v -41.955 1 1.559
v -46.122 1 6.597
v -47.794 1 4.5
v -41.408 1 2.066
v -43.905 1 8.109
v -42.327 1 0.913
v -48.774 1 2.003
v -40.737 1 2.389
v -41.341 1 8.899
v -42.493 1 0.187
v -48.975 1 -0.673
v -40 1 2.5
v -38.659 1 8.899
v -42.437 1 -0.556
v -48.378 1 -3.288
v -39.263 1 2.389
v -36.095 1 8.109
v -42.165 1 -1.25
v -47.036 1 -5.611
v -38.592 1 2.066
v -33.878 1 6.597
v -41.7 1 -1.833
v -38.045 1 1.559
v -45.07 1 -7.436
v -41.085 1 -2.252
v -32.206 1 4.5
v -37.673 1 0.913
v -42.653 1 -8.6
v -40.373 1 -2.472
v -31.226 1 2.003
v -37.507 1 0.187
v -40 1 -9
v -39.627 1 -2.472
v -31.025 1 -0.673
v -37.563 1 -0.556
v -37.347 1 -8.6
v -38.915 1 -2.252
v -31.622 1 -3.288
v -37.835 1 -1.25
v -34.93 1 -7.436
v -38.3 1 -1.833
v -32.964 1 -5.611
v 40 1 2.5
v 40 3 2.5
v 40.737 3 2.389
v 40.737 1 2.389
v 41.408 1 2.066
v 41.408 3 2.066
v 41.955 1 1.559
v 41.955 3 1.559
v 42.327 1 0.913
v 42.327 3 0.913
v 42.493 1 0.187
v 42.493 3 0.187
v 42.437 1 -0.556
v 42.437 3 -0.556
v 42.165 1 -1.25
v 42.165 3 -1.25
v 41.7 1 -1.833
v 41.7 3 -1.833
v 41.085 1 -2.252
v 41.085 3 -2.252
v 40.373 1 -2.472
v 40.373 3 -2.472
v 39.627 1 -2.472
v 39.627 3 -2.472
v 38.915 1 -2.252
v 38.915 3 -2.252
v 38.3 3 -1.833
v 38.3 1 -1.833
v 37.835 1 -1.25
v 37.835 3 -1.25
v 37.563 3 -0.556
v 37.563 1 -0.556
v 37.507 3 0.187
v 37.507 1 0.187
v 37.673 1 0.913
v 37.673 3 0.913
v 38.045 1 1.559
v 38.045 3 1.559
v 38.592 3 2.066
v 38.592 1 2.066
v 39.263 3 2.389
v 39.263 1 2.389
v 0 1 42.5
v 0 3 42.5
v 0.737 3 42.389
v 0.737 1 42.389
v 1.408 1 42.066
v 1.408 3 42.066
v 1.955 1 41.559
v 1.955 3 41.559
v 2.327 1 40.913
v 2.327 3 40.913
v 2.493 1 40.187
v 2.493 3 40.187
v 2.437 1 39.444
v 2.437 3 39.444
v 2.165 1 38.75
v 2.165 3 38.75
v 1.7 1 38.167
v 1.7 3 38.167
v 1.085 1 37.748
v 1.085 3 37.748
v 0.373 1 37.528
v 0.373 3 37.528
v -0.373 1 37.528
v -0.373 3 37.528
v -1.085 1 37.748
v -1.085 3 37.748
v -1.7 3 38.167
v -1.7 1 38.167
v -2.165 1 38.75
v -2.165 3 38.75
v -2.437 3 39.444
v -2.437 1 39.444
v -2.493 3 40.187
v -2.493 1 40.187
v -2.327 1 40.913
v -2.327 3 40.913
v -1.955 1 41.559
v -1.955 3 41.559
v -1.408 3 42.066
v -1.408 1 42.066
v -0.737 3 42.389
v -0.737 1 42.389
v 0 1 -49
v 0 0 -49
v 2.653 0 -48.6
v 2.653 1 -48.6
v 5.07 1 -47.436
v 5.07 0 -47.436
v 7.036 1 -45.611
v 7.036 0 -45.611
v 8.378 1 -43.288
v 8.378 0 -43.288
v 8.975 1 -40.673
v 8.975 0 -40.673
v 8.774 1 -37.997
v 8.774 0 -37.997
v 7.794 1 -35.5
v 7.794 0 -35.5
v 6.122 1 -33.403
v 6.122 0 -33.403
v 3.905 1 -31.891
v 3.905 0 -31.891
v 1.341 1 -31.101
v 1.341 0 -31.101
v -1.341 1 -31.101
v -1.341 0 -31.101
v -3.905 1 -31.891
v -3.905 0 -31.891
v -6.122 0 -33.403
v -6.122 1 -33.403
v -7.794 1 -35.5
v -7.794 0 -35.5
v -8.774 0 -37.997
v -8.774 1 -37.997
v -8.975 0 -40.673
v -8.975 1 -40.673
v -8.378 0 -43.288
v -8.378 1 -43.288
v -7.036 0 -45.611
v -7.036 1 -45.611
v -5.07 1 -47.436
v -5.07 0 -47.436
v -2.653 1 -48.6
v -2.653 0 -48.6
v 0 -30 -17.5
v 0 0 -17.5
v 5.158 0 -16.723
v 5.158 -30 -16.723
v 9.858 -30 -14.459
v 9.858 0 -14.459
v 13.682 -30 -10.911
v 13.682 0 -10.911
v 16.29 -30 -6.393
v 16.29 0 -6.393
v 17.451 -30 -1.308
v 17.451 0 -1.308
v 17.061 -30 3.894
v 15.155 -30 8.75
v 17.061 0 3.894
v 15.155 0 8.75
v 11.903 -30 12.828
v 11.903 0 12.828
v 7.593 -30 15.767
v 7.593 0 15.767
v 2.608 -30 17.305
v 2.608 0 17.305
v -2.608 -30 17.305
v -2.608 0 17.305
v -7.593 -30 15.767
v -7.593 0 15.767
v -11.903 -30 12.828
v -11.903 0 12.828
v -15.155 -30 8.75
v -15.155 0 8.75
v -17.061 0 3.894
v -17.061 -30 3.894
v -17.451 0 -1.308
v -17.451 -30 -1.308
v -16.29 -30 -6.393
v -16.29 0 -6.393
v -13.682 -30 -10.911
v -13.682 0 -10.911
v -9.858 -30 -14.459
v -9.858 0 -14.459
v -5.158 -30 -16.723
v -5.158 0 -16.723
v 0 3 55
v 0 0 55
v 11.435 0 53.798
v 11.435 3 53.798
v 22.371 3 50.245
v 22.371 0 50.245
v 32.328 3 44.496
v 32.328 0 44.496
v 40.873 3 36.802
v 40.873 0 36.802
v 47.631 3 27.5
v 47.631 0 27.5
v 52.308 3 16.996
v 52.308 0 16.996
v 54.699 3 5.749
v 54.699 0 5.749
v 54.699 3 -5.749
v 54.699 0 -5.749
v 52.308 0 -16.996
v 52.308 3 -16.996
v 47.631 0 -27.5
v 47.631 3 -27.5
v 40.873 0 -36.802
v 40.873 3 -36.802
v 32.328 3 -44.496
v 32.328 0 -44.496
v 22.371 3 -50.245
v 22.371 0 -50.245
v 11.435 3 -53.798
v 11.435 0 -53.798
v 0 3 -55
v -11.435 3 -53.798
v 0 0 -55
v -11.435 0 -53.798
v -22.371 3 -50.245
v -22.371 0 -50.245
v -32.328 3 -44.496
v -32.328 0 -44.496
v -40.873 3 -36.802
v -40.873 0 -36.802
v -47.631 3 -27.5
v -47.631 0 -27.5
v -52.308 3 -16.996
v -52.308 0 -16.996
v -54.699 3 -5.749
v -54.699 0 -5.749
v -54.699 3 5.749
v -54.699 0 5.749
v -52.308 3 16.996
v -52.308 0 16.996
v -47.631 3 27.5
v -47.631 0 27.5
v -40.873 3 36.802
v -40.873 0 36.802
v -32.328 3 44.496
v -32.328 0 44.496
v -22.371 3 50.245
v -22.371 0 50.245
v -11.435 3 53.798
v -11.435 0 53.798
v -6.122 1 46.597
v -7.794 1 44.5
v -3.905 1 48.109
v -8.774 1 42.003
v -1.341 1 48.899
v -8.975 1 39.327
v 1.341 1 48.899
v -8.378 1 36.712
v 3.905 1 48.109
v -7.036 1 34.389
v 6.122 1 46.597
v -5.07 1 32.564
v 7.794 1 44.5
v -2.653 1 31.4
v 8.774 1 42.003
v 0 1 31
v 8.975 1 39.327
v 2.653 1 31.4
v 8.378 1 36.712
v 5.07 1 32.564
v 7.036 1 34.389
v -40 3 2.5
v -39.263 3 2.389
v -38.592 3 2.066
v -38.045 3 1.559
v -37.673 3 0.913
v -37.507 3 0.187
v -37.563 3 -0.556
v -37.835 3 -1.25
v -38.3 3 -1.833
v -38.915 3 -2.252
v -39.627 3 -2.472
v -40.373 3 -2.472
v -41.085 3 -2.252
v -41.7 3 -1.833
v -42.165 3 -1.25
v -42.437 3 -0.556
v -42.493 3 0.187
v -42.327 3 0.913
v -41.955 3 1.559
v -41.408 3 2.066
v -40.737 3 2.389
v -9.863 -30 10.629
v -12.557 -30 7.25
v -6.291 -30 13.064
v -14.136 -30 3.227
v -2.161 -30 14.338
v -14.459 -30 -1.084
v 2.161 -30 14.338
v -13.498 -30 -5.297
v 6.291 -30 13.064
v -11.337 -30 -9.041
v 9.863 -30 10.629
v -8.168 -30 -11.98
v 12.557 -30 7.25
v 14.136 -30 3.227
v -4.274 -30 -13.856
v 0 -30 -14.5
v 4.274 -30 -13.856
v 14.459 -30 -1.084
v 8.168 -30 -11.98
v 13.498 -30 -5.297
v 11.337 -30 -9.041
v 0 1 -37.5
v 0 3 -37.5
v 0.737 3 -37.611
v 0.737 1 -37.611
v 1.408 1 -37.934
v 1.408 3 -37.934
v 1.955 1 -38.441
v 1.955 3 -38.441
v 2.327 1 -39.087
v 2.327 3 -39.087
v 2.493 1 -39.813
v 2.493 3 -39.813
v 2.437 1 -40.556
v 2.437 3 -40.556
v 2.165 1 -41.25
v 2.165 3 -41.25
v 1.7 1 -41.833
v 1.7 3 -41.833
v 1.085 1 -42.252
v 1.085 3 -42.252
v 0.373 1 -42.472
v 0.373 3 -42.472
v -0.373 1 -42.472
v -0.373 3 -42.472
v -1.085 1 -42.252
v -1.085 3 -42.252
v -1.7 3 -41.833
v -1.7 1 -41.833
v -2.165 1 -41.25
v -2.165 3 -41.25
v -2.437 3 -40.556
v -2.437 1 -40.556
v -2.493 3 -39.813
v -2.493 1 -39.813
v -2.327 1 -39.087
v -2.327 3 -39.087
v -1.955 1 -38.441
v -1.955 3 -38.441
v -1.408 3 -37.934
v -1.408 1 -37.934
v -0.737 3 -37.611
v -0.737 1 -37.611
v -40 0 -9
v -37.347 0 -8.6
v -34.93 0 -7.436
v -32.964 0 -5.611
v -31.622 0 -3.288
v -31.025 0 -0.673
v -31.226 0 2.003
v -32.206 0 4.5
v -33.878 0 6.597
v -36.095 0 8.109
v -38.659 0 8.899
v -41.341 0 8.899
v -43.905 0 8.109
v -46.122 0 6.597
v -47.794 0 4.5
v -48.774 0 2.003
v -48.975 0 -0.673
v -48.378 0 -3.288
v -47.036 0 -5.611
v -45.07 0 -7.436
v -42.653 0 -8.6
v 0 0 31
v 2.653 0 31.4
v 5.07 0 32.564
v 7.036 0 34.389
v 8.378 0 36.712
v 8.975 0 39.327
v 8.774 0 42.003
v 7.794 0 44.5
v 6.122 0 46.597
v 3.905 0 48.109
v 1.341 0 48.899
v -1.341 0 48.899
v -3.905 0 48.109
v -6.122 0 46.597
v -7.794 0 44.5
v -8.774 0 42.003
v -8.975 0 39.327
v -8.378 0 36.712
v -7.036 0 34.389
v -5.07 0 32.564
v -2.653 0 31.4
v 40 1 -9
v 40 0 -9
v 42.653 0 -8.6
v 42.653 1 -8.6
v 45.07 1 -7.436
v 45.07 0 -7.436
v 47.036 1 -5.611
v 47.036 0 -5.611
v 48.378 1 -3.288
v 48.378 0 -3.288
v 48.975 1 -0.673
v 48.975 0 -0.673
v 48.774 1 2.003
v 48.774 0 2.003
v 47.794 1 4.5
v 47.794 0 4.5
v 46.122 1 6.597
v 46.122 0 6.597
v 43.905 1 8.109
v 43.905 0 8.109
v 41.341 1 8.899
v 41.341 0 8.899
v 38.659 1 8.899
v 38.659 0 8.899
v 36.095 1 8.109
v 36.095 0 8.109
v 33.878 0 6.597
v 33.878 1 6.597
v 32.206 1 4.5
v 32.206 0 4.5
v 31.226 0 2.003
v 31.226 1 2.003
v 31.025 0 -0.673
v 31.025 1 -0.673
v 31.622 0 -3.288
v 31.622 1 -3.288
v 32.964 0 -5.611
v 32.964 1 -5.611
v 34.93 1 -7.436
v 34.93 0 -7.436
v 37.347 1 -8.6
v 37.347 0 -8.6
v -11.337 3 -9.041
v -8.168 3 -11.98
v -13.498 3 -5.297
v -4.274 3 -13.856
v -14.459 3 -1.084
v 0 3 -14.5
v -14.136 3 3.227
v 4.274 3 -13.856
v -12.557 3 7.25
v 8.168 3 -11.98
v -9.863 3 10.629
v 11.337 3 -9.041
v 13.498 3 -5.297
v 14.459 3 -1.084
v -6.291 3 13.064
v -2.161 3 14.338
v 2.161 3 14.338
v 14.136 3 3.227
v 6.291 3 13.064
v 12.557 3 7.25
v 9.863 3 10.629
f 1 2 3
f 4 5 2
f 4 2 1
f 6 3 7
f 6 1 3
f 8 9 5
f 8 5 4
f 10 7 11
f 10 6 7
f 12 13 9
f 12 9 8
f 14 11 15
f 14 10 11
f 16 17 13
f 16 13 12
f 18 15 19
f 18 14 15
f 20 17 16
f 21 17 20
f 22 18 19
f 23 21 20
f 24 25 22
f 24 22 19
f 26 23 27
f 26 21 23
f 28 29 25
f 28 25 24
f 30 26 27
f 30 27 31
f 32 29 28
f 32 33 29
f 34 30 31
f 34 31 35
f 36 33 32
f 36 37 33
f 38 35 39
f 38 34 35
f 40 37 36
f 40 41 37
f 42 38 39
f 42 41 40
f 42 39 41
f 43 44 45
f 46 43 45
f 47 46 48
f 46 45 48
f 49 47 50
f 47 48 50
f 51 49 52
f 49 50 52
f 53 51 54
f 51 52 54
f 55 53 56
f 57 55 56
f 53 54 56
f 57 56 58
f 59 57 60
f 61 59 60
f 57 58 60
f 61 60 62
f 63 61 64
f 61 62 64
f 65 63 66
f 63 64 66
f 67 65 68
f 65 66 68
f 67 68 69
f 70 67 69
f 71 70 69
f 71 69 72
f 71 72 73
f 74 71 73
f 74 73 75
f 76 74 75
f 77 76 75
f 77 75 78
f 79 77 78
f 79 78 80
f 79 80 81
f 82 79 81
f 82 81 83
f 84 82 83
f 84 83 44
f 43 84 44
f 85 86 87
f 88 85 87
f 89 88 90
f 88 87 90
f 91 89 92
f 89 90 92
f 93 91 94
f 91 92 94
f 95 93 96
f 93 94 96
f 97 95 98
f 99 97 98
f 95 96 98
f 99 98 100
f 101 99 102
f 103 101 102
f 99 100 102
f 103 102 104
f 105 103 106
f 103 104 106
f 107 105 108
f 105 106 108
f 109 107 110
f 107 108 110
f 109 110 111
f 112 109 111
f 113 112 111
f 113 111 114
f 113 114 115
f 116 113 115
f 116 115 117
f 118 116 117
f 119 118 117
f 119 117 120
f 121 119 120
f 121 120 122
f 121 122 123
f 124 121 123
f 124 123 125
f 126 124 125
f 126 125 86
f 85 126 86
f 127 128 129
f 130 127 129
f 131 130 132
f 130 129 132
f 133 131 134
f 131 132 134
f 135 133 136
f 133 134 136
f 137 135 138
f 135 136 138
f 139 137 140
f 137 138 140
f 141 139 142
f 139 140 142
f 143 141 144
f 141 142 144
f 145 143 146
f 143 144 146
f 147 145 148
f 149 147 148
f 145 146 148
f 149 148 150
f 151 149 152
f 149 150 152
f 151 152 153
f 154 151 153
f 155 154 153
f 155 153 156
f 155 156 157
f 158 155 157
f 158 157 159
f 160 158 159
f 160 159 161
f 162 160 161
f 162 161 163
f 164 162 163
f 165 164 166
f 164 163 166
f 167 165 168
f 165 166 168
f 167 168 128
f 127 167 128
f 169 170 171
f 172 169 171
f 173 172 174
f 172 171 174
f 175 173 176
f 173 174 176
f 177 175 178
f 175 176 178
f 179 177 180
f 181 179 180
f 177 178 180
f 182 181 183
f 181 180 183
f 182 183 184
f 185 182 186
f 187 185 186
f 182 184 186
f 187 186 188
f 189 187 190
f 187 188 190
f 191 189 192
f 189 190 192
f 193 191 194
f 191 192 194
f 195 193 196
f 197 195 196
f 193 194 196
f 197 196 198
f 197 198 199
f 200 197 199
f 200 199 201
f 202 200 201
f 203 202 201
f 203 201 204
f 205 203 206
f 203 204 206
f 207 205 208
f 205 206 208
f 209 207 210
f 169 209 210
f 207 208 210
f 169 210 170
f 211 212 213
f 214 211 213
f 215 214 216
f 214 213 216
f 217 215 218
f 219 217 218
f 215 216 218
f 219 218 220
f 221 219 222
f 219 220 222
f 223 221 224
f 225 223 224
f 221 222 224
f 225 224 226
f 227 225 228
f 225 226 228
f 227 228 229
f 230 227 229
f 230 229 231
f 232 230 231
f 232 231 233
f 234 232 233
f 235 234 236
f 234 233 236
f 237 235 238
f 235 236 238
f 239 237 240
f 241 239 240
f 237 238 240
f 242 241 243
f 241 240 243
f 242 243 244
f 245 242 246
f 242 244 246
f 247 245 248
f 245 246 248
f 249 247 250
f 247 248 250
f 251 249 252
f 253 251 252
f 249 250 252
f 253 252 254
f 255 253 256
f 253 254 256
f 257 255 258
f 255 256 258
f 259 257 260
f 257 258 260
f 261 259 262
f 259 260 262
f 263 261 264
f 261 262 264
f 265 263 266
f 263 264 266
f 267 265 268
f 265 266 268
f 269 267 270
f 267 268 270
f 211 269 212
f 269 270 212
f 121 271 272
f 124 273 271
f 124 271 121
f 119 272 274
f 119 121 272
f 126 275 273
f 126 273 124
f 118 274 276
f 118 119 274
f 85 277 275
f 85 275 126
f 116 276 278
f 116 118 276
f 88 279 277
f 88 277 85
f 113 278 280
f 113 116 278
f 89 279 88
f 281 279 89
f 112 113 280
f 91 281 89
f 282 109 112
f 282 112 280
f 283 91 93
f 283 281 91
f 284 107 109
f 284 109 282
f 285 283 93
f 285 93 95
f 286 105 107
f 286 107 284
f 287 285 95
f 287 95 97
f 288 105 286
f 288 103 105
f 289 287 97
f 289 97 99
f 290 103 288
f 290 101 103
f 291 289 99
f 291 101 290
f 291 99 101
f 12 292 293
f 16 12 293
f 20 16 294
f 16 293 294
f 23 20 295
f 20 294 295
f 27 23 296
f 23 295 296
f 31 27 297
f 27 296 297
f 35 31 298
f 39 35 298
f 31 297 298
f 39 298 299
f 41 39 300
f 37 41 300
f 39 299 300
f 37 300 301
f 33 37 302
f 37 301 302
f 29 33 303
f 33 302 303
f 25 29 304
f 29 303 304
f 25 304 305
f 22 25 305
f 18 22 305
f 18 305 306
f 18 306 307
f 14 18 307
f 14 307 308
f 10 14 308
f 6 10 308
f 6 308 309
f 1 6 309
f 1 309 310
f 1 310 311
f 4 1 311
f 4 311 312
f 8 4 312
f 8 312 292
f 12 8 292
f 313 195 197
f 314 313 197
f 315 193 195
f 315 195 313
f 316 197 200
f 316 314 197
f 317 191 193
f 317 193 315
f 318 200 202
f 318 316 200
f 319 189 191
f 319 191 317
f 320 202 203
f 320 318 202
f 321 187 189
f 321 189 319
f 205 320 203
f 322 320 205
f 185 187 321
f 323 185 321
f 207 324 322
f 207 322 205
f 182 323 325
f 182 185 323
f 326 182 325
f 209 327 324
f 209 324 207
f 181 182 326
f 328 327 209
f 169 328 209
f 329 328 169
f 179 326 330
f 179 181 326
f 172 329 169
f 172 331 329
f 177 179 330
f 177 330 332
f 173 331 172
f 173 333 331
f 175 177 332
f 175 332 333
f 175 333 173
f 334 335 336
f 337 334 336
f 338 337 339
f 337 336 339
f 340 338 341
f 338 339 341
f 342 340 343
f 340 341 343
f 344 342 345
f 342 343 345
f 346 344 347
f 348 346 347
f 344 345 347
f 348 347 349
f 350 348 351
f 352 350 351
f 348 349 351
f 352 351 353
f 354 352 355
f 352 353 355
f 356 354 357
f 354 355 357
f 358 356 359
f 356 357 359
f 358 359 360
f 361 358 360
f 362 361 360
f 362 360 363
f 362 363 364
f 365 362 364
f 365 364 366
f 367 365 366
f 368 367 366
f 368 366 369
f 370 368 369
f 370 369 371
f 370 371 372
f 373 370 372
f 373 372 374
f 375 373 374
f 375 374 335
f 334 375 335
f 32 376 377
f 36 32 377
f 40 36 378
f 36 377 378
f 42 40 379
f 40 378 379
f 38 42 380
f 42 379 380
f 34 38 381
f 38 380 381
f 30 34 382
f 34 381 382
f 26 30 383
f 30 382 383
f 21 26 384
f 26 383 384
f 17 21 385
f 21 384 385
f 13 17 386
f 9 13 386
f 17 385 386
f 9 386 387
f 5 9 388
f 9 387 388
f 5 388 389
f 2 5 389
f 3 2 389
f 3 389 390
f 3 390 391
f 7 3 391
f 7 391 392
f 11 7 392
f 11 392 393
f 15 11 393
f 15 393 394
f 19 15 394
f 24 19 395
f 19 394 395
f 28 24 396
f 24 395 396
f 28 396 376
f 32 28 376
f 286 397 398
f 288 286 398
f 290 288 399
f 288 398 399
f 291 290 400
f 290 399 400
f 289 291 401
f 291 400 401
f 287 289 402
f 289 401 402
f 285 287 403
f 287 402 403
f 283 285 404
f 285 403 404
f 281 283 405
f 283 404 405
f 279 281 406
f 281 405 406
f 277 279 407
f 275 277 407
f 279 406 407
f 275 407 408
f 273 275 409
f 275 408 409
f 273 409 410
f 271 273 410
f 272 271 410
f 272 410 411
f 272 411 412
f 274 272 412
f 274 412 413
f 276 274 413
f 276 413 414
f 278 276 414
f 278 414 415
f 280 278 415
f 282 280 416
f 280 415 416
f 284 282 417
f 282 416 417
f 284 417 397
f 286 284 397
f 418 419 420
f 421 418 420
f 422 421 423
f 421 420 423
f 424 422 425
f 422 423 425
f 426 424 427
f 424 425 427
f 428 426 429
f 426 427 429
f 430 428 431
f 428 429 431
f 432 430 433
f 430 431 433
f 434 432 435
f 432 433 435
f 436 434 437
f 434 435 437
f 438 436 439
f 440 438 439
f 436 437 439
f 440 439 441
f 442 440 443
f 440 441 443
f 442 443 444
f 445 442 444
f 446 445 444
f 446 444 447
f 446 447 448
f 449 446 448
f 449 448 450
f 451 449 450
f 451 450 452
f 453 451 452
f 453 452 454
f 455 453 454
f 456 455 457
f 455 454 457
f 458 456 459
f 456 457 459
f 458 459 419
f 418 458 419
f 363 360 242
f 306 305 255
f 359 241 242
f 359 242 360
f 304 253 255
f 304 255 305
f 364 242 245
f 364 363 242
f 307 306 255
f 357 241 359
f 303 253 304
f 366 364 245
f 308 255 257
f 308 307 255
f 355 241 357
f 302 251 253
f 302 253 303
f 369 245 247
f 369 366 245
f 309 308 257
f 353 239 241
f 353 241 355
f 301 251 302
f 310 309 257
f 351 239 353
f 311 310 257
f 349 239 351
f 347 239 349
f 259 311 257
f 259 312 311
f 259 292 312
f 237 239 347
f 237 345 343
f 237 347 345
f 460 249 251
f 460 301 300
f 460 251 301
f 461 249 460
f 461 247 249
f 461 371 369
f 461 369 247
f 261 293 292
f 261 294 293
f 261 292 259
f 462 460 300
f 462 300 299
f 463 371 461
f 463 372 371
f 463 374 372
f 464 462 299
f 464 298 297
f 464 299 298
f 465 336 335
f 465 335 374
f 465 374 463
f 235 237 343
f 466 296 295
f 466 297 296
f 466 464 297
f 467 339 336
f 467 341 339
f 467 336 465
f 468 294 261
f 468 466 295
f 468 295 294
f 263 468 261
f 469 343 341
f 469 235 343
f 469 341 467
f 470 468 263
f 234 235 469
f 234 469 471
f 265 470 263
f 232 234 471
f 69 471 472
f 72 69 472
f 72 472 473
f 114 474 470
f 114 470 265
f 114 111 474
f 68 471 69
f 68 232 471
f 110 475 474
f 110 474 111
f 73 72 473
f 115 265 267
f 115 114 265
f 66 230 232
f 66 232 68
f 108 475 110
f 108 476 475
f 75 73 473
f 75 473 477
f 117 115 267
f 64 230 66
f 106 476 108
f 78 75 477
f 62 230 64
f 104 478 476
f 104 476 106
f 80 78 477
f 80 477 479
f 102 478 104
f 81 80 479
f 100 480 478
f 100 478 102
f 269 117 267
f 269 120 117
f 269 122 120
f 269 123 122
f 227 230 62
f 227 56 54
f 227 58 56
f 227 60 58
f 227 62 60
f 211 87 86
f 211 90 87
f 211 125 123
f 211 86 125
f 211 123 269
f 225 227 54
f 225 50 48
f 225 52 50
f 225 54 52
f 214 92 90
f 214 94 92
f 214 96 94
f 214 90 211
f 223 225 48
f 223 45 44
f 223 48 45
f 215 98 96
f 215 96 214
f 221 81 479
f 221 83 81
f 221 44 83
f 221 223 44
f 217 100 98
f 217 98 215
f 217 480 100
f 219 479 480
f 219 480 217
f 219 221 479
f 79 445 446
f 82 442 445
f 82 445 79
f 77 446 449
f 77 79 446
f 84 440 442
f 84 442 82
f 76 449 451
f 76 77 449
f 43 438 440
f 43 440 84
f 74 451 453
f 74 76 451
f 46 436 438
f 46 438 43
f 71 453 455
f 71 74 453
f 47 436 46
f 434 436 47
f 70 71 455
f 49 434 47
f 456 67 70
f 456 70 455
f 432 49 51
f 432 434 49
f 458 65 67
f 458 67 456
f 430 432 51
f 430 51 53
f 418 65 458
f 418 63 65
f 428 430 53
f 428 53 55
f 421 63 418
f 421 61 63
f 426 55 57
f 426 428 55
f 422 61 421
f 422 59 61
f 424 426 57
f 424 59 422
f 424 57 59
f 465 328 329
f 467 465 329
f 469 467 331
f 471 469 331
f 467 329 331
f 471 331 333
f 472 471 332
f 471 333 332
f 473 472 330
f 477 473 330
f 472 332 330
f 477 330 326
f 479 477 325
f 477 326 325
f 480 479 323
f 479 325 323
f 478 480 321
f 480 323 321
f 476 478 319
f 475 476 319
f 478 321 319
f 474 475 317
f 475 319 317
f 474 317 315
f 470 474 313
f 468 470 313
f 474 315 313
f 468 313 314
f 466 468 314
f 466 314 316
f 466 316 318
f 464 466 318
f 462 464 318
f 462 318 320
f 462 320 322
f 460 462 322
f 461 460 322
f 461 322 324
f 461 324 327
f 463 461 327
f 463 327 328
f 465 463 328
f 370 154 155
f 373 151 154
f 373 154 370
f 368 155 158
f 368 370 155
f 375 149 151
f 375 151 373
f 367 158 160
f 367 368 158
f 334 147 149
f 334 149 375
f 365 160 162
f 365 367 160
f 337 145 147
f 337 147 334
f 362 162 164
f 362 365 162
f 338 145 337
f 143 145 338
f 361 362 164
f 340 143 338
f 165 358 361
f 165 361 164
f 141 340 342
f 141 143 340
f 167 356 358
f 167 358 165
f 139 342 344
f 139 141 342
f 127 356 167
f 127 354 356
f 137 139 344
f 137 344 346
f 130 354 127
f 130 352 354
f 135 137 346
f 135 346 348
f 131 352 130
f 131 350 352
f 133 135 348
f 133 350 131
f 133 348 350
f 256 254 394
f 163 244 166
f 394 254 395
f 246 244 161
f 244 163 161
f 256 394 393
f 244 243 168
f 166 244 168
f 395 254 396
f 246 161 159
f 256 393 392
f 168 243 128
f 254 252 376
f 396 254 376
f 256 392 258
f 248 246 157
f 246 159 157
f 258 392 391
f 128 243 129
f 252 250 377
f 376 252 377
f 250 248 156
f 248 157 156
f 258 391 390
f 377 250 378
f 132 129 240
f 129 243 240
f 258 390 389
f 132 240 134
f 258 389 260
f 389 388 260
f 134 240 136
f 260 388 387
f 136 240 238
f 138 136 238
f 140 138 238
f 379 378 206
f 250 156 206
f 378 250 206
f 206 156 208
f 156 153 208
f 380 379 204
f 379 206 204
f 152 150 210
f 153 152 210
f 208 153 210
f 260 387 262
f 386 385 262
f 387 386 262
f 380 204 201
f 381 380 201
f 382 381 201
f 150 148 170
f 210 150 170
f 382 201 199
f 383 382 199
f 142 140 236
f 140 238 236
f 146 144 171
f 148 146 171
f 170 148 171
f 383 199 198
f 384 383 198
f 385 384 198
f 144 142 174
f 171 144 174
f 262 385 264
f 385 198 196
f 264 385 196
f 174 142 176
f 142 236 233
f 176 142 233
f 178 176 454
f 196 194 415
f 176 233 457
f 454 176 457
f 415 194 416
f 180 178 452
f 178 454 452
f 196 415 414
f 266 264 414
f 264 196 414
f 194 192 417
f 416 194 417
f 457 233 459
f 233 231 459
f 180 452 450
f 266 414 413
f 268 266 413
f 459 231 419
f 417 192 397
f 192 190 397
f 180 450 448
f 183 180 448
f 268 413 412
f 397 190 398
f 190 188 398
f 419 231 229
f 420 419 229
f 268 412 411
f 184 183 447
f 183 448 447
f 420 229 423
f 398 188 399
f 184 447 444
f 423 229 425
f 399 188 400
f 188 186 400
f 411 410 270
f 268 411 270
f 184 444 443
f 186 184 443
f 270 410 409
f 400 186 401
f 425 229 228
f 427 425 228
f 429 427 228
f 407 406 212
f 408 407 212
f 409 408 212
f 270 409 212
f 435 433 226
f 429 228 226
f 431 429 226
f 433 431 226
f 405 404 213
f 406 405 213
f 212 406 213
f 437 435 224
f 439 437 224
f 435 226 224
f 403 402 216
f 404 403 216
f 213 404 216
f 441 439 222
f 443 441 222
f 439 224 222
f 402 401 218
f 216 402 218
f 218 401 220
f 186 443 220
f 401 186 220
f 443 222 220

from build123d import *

# Parameters (mm, degrees)
SKETCH1_R           = 55
BOSS_EXTRUDE1_DEPTH = 3
SKETCH2_R           = 17.5
BOSS_EXTRUDE2_DEPTH = 30
SKETCH3_R           = 14.5
CUT_EXTRUDE1_DEPTH  = 85.492603227
SKETCH4_R           = 2.5
CUT_EXTRUDE2_DEPTH  = 85.492603227
SKETCH5_R           = 9
CUT_EXTRUDE3_DEPTH  = 1


with BuildPart() as part:
    # Sketch1 → Boss-Extrude1 (new body)
    with BuildSketch(Plane(origin=(0, 0, 0), x_dir=(1, 0, 0), z_dir=(0, 1, 0))):
        with Locations(Location((0, 0, 0), (0, 0, 270))):
            Circle(SKETCH1_R)
    extrude(amount=BOSS_EXTRUDE1_DEPTH)

    # Sketch2 → Boss-Extrude2 (add)
    with BuildSketch(Plane.XZ):
        with Locations(Location((0, 0, 0), (0, 0, 270))):
            Circle(SKETCH2_R)
    extrude(amount=BOSS_EXTRUDE2_DEPTH)

    # Sketch3 → Cut-Extrude1 (cut, through all)
    with BuildSketch(Plane.XZ.offset(30)):
        with Locations(Location((0, 0, 0), (0, 0, 270))):
            Circle(SKETCH3_R)
    extrude(amount=-CUT_EXTRUDE1_DEPTH, mode=Mode.SUBTRACT)

    # Sketch4 → Cut-Extrude2 (cut, through all)
    with BuildSketch(Plane(origin=(0, 3, 0), x_dir=(1, 0, 0), z_dir=(0, 1, 0))):
        with Locations(Location((0, 40, 0), (0, 0, 270))):
            Circle(SKETCH4_R)
        with Locations(Location((40, 0, 0), (0, 0, 270))):
            Circle(SKETCH4_R)
        with Locations(Location((0, -40, 0), (0, 0, 270))):
            Circle(SKETCH4_R)
        with Locations(Location((-40, 0, 0), (0, 0, 270))):
            Circle(SKETCH4_R)
    extrude(amount=-CUT_EXTRUDE2_DEPTH, mode=Mode.SUBTRACT)

    # Sketch5 → Cut-Extrude3 (cut)
    with BuildSketch(Plane.XZ):
        with Locations(Location((0, 40, 0), (0, 0, 270))):
            Circle(SKETCH5_R)
        with Locations(Location((40, 0, 0), (0, 0, 270))):
            Circle(SKETCH5_R)
        with Locations(Location((0, -40, 0), (0, 0, 270))):
            Circle(SKETCH5_R)
        with Locations(Location((-40, 0, 0), (0, 0, 270))):
            Circle(SKETCH5_R)
    extrude(amount=-CUT_EXTRUDE3_DEPTH, mode=Mode.SUBTRACT)


solid = part.part
